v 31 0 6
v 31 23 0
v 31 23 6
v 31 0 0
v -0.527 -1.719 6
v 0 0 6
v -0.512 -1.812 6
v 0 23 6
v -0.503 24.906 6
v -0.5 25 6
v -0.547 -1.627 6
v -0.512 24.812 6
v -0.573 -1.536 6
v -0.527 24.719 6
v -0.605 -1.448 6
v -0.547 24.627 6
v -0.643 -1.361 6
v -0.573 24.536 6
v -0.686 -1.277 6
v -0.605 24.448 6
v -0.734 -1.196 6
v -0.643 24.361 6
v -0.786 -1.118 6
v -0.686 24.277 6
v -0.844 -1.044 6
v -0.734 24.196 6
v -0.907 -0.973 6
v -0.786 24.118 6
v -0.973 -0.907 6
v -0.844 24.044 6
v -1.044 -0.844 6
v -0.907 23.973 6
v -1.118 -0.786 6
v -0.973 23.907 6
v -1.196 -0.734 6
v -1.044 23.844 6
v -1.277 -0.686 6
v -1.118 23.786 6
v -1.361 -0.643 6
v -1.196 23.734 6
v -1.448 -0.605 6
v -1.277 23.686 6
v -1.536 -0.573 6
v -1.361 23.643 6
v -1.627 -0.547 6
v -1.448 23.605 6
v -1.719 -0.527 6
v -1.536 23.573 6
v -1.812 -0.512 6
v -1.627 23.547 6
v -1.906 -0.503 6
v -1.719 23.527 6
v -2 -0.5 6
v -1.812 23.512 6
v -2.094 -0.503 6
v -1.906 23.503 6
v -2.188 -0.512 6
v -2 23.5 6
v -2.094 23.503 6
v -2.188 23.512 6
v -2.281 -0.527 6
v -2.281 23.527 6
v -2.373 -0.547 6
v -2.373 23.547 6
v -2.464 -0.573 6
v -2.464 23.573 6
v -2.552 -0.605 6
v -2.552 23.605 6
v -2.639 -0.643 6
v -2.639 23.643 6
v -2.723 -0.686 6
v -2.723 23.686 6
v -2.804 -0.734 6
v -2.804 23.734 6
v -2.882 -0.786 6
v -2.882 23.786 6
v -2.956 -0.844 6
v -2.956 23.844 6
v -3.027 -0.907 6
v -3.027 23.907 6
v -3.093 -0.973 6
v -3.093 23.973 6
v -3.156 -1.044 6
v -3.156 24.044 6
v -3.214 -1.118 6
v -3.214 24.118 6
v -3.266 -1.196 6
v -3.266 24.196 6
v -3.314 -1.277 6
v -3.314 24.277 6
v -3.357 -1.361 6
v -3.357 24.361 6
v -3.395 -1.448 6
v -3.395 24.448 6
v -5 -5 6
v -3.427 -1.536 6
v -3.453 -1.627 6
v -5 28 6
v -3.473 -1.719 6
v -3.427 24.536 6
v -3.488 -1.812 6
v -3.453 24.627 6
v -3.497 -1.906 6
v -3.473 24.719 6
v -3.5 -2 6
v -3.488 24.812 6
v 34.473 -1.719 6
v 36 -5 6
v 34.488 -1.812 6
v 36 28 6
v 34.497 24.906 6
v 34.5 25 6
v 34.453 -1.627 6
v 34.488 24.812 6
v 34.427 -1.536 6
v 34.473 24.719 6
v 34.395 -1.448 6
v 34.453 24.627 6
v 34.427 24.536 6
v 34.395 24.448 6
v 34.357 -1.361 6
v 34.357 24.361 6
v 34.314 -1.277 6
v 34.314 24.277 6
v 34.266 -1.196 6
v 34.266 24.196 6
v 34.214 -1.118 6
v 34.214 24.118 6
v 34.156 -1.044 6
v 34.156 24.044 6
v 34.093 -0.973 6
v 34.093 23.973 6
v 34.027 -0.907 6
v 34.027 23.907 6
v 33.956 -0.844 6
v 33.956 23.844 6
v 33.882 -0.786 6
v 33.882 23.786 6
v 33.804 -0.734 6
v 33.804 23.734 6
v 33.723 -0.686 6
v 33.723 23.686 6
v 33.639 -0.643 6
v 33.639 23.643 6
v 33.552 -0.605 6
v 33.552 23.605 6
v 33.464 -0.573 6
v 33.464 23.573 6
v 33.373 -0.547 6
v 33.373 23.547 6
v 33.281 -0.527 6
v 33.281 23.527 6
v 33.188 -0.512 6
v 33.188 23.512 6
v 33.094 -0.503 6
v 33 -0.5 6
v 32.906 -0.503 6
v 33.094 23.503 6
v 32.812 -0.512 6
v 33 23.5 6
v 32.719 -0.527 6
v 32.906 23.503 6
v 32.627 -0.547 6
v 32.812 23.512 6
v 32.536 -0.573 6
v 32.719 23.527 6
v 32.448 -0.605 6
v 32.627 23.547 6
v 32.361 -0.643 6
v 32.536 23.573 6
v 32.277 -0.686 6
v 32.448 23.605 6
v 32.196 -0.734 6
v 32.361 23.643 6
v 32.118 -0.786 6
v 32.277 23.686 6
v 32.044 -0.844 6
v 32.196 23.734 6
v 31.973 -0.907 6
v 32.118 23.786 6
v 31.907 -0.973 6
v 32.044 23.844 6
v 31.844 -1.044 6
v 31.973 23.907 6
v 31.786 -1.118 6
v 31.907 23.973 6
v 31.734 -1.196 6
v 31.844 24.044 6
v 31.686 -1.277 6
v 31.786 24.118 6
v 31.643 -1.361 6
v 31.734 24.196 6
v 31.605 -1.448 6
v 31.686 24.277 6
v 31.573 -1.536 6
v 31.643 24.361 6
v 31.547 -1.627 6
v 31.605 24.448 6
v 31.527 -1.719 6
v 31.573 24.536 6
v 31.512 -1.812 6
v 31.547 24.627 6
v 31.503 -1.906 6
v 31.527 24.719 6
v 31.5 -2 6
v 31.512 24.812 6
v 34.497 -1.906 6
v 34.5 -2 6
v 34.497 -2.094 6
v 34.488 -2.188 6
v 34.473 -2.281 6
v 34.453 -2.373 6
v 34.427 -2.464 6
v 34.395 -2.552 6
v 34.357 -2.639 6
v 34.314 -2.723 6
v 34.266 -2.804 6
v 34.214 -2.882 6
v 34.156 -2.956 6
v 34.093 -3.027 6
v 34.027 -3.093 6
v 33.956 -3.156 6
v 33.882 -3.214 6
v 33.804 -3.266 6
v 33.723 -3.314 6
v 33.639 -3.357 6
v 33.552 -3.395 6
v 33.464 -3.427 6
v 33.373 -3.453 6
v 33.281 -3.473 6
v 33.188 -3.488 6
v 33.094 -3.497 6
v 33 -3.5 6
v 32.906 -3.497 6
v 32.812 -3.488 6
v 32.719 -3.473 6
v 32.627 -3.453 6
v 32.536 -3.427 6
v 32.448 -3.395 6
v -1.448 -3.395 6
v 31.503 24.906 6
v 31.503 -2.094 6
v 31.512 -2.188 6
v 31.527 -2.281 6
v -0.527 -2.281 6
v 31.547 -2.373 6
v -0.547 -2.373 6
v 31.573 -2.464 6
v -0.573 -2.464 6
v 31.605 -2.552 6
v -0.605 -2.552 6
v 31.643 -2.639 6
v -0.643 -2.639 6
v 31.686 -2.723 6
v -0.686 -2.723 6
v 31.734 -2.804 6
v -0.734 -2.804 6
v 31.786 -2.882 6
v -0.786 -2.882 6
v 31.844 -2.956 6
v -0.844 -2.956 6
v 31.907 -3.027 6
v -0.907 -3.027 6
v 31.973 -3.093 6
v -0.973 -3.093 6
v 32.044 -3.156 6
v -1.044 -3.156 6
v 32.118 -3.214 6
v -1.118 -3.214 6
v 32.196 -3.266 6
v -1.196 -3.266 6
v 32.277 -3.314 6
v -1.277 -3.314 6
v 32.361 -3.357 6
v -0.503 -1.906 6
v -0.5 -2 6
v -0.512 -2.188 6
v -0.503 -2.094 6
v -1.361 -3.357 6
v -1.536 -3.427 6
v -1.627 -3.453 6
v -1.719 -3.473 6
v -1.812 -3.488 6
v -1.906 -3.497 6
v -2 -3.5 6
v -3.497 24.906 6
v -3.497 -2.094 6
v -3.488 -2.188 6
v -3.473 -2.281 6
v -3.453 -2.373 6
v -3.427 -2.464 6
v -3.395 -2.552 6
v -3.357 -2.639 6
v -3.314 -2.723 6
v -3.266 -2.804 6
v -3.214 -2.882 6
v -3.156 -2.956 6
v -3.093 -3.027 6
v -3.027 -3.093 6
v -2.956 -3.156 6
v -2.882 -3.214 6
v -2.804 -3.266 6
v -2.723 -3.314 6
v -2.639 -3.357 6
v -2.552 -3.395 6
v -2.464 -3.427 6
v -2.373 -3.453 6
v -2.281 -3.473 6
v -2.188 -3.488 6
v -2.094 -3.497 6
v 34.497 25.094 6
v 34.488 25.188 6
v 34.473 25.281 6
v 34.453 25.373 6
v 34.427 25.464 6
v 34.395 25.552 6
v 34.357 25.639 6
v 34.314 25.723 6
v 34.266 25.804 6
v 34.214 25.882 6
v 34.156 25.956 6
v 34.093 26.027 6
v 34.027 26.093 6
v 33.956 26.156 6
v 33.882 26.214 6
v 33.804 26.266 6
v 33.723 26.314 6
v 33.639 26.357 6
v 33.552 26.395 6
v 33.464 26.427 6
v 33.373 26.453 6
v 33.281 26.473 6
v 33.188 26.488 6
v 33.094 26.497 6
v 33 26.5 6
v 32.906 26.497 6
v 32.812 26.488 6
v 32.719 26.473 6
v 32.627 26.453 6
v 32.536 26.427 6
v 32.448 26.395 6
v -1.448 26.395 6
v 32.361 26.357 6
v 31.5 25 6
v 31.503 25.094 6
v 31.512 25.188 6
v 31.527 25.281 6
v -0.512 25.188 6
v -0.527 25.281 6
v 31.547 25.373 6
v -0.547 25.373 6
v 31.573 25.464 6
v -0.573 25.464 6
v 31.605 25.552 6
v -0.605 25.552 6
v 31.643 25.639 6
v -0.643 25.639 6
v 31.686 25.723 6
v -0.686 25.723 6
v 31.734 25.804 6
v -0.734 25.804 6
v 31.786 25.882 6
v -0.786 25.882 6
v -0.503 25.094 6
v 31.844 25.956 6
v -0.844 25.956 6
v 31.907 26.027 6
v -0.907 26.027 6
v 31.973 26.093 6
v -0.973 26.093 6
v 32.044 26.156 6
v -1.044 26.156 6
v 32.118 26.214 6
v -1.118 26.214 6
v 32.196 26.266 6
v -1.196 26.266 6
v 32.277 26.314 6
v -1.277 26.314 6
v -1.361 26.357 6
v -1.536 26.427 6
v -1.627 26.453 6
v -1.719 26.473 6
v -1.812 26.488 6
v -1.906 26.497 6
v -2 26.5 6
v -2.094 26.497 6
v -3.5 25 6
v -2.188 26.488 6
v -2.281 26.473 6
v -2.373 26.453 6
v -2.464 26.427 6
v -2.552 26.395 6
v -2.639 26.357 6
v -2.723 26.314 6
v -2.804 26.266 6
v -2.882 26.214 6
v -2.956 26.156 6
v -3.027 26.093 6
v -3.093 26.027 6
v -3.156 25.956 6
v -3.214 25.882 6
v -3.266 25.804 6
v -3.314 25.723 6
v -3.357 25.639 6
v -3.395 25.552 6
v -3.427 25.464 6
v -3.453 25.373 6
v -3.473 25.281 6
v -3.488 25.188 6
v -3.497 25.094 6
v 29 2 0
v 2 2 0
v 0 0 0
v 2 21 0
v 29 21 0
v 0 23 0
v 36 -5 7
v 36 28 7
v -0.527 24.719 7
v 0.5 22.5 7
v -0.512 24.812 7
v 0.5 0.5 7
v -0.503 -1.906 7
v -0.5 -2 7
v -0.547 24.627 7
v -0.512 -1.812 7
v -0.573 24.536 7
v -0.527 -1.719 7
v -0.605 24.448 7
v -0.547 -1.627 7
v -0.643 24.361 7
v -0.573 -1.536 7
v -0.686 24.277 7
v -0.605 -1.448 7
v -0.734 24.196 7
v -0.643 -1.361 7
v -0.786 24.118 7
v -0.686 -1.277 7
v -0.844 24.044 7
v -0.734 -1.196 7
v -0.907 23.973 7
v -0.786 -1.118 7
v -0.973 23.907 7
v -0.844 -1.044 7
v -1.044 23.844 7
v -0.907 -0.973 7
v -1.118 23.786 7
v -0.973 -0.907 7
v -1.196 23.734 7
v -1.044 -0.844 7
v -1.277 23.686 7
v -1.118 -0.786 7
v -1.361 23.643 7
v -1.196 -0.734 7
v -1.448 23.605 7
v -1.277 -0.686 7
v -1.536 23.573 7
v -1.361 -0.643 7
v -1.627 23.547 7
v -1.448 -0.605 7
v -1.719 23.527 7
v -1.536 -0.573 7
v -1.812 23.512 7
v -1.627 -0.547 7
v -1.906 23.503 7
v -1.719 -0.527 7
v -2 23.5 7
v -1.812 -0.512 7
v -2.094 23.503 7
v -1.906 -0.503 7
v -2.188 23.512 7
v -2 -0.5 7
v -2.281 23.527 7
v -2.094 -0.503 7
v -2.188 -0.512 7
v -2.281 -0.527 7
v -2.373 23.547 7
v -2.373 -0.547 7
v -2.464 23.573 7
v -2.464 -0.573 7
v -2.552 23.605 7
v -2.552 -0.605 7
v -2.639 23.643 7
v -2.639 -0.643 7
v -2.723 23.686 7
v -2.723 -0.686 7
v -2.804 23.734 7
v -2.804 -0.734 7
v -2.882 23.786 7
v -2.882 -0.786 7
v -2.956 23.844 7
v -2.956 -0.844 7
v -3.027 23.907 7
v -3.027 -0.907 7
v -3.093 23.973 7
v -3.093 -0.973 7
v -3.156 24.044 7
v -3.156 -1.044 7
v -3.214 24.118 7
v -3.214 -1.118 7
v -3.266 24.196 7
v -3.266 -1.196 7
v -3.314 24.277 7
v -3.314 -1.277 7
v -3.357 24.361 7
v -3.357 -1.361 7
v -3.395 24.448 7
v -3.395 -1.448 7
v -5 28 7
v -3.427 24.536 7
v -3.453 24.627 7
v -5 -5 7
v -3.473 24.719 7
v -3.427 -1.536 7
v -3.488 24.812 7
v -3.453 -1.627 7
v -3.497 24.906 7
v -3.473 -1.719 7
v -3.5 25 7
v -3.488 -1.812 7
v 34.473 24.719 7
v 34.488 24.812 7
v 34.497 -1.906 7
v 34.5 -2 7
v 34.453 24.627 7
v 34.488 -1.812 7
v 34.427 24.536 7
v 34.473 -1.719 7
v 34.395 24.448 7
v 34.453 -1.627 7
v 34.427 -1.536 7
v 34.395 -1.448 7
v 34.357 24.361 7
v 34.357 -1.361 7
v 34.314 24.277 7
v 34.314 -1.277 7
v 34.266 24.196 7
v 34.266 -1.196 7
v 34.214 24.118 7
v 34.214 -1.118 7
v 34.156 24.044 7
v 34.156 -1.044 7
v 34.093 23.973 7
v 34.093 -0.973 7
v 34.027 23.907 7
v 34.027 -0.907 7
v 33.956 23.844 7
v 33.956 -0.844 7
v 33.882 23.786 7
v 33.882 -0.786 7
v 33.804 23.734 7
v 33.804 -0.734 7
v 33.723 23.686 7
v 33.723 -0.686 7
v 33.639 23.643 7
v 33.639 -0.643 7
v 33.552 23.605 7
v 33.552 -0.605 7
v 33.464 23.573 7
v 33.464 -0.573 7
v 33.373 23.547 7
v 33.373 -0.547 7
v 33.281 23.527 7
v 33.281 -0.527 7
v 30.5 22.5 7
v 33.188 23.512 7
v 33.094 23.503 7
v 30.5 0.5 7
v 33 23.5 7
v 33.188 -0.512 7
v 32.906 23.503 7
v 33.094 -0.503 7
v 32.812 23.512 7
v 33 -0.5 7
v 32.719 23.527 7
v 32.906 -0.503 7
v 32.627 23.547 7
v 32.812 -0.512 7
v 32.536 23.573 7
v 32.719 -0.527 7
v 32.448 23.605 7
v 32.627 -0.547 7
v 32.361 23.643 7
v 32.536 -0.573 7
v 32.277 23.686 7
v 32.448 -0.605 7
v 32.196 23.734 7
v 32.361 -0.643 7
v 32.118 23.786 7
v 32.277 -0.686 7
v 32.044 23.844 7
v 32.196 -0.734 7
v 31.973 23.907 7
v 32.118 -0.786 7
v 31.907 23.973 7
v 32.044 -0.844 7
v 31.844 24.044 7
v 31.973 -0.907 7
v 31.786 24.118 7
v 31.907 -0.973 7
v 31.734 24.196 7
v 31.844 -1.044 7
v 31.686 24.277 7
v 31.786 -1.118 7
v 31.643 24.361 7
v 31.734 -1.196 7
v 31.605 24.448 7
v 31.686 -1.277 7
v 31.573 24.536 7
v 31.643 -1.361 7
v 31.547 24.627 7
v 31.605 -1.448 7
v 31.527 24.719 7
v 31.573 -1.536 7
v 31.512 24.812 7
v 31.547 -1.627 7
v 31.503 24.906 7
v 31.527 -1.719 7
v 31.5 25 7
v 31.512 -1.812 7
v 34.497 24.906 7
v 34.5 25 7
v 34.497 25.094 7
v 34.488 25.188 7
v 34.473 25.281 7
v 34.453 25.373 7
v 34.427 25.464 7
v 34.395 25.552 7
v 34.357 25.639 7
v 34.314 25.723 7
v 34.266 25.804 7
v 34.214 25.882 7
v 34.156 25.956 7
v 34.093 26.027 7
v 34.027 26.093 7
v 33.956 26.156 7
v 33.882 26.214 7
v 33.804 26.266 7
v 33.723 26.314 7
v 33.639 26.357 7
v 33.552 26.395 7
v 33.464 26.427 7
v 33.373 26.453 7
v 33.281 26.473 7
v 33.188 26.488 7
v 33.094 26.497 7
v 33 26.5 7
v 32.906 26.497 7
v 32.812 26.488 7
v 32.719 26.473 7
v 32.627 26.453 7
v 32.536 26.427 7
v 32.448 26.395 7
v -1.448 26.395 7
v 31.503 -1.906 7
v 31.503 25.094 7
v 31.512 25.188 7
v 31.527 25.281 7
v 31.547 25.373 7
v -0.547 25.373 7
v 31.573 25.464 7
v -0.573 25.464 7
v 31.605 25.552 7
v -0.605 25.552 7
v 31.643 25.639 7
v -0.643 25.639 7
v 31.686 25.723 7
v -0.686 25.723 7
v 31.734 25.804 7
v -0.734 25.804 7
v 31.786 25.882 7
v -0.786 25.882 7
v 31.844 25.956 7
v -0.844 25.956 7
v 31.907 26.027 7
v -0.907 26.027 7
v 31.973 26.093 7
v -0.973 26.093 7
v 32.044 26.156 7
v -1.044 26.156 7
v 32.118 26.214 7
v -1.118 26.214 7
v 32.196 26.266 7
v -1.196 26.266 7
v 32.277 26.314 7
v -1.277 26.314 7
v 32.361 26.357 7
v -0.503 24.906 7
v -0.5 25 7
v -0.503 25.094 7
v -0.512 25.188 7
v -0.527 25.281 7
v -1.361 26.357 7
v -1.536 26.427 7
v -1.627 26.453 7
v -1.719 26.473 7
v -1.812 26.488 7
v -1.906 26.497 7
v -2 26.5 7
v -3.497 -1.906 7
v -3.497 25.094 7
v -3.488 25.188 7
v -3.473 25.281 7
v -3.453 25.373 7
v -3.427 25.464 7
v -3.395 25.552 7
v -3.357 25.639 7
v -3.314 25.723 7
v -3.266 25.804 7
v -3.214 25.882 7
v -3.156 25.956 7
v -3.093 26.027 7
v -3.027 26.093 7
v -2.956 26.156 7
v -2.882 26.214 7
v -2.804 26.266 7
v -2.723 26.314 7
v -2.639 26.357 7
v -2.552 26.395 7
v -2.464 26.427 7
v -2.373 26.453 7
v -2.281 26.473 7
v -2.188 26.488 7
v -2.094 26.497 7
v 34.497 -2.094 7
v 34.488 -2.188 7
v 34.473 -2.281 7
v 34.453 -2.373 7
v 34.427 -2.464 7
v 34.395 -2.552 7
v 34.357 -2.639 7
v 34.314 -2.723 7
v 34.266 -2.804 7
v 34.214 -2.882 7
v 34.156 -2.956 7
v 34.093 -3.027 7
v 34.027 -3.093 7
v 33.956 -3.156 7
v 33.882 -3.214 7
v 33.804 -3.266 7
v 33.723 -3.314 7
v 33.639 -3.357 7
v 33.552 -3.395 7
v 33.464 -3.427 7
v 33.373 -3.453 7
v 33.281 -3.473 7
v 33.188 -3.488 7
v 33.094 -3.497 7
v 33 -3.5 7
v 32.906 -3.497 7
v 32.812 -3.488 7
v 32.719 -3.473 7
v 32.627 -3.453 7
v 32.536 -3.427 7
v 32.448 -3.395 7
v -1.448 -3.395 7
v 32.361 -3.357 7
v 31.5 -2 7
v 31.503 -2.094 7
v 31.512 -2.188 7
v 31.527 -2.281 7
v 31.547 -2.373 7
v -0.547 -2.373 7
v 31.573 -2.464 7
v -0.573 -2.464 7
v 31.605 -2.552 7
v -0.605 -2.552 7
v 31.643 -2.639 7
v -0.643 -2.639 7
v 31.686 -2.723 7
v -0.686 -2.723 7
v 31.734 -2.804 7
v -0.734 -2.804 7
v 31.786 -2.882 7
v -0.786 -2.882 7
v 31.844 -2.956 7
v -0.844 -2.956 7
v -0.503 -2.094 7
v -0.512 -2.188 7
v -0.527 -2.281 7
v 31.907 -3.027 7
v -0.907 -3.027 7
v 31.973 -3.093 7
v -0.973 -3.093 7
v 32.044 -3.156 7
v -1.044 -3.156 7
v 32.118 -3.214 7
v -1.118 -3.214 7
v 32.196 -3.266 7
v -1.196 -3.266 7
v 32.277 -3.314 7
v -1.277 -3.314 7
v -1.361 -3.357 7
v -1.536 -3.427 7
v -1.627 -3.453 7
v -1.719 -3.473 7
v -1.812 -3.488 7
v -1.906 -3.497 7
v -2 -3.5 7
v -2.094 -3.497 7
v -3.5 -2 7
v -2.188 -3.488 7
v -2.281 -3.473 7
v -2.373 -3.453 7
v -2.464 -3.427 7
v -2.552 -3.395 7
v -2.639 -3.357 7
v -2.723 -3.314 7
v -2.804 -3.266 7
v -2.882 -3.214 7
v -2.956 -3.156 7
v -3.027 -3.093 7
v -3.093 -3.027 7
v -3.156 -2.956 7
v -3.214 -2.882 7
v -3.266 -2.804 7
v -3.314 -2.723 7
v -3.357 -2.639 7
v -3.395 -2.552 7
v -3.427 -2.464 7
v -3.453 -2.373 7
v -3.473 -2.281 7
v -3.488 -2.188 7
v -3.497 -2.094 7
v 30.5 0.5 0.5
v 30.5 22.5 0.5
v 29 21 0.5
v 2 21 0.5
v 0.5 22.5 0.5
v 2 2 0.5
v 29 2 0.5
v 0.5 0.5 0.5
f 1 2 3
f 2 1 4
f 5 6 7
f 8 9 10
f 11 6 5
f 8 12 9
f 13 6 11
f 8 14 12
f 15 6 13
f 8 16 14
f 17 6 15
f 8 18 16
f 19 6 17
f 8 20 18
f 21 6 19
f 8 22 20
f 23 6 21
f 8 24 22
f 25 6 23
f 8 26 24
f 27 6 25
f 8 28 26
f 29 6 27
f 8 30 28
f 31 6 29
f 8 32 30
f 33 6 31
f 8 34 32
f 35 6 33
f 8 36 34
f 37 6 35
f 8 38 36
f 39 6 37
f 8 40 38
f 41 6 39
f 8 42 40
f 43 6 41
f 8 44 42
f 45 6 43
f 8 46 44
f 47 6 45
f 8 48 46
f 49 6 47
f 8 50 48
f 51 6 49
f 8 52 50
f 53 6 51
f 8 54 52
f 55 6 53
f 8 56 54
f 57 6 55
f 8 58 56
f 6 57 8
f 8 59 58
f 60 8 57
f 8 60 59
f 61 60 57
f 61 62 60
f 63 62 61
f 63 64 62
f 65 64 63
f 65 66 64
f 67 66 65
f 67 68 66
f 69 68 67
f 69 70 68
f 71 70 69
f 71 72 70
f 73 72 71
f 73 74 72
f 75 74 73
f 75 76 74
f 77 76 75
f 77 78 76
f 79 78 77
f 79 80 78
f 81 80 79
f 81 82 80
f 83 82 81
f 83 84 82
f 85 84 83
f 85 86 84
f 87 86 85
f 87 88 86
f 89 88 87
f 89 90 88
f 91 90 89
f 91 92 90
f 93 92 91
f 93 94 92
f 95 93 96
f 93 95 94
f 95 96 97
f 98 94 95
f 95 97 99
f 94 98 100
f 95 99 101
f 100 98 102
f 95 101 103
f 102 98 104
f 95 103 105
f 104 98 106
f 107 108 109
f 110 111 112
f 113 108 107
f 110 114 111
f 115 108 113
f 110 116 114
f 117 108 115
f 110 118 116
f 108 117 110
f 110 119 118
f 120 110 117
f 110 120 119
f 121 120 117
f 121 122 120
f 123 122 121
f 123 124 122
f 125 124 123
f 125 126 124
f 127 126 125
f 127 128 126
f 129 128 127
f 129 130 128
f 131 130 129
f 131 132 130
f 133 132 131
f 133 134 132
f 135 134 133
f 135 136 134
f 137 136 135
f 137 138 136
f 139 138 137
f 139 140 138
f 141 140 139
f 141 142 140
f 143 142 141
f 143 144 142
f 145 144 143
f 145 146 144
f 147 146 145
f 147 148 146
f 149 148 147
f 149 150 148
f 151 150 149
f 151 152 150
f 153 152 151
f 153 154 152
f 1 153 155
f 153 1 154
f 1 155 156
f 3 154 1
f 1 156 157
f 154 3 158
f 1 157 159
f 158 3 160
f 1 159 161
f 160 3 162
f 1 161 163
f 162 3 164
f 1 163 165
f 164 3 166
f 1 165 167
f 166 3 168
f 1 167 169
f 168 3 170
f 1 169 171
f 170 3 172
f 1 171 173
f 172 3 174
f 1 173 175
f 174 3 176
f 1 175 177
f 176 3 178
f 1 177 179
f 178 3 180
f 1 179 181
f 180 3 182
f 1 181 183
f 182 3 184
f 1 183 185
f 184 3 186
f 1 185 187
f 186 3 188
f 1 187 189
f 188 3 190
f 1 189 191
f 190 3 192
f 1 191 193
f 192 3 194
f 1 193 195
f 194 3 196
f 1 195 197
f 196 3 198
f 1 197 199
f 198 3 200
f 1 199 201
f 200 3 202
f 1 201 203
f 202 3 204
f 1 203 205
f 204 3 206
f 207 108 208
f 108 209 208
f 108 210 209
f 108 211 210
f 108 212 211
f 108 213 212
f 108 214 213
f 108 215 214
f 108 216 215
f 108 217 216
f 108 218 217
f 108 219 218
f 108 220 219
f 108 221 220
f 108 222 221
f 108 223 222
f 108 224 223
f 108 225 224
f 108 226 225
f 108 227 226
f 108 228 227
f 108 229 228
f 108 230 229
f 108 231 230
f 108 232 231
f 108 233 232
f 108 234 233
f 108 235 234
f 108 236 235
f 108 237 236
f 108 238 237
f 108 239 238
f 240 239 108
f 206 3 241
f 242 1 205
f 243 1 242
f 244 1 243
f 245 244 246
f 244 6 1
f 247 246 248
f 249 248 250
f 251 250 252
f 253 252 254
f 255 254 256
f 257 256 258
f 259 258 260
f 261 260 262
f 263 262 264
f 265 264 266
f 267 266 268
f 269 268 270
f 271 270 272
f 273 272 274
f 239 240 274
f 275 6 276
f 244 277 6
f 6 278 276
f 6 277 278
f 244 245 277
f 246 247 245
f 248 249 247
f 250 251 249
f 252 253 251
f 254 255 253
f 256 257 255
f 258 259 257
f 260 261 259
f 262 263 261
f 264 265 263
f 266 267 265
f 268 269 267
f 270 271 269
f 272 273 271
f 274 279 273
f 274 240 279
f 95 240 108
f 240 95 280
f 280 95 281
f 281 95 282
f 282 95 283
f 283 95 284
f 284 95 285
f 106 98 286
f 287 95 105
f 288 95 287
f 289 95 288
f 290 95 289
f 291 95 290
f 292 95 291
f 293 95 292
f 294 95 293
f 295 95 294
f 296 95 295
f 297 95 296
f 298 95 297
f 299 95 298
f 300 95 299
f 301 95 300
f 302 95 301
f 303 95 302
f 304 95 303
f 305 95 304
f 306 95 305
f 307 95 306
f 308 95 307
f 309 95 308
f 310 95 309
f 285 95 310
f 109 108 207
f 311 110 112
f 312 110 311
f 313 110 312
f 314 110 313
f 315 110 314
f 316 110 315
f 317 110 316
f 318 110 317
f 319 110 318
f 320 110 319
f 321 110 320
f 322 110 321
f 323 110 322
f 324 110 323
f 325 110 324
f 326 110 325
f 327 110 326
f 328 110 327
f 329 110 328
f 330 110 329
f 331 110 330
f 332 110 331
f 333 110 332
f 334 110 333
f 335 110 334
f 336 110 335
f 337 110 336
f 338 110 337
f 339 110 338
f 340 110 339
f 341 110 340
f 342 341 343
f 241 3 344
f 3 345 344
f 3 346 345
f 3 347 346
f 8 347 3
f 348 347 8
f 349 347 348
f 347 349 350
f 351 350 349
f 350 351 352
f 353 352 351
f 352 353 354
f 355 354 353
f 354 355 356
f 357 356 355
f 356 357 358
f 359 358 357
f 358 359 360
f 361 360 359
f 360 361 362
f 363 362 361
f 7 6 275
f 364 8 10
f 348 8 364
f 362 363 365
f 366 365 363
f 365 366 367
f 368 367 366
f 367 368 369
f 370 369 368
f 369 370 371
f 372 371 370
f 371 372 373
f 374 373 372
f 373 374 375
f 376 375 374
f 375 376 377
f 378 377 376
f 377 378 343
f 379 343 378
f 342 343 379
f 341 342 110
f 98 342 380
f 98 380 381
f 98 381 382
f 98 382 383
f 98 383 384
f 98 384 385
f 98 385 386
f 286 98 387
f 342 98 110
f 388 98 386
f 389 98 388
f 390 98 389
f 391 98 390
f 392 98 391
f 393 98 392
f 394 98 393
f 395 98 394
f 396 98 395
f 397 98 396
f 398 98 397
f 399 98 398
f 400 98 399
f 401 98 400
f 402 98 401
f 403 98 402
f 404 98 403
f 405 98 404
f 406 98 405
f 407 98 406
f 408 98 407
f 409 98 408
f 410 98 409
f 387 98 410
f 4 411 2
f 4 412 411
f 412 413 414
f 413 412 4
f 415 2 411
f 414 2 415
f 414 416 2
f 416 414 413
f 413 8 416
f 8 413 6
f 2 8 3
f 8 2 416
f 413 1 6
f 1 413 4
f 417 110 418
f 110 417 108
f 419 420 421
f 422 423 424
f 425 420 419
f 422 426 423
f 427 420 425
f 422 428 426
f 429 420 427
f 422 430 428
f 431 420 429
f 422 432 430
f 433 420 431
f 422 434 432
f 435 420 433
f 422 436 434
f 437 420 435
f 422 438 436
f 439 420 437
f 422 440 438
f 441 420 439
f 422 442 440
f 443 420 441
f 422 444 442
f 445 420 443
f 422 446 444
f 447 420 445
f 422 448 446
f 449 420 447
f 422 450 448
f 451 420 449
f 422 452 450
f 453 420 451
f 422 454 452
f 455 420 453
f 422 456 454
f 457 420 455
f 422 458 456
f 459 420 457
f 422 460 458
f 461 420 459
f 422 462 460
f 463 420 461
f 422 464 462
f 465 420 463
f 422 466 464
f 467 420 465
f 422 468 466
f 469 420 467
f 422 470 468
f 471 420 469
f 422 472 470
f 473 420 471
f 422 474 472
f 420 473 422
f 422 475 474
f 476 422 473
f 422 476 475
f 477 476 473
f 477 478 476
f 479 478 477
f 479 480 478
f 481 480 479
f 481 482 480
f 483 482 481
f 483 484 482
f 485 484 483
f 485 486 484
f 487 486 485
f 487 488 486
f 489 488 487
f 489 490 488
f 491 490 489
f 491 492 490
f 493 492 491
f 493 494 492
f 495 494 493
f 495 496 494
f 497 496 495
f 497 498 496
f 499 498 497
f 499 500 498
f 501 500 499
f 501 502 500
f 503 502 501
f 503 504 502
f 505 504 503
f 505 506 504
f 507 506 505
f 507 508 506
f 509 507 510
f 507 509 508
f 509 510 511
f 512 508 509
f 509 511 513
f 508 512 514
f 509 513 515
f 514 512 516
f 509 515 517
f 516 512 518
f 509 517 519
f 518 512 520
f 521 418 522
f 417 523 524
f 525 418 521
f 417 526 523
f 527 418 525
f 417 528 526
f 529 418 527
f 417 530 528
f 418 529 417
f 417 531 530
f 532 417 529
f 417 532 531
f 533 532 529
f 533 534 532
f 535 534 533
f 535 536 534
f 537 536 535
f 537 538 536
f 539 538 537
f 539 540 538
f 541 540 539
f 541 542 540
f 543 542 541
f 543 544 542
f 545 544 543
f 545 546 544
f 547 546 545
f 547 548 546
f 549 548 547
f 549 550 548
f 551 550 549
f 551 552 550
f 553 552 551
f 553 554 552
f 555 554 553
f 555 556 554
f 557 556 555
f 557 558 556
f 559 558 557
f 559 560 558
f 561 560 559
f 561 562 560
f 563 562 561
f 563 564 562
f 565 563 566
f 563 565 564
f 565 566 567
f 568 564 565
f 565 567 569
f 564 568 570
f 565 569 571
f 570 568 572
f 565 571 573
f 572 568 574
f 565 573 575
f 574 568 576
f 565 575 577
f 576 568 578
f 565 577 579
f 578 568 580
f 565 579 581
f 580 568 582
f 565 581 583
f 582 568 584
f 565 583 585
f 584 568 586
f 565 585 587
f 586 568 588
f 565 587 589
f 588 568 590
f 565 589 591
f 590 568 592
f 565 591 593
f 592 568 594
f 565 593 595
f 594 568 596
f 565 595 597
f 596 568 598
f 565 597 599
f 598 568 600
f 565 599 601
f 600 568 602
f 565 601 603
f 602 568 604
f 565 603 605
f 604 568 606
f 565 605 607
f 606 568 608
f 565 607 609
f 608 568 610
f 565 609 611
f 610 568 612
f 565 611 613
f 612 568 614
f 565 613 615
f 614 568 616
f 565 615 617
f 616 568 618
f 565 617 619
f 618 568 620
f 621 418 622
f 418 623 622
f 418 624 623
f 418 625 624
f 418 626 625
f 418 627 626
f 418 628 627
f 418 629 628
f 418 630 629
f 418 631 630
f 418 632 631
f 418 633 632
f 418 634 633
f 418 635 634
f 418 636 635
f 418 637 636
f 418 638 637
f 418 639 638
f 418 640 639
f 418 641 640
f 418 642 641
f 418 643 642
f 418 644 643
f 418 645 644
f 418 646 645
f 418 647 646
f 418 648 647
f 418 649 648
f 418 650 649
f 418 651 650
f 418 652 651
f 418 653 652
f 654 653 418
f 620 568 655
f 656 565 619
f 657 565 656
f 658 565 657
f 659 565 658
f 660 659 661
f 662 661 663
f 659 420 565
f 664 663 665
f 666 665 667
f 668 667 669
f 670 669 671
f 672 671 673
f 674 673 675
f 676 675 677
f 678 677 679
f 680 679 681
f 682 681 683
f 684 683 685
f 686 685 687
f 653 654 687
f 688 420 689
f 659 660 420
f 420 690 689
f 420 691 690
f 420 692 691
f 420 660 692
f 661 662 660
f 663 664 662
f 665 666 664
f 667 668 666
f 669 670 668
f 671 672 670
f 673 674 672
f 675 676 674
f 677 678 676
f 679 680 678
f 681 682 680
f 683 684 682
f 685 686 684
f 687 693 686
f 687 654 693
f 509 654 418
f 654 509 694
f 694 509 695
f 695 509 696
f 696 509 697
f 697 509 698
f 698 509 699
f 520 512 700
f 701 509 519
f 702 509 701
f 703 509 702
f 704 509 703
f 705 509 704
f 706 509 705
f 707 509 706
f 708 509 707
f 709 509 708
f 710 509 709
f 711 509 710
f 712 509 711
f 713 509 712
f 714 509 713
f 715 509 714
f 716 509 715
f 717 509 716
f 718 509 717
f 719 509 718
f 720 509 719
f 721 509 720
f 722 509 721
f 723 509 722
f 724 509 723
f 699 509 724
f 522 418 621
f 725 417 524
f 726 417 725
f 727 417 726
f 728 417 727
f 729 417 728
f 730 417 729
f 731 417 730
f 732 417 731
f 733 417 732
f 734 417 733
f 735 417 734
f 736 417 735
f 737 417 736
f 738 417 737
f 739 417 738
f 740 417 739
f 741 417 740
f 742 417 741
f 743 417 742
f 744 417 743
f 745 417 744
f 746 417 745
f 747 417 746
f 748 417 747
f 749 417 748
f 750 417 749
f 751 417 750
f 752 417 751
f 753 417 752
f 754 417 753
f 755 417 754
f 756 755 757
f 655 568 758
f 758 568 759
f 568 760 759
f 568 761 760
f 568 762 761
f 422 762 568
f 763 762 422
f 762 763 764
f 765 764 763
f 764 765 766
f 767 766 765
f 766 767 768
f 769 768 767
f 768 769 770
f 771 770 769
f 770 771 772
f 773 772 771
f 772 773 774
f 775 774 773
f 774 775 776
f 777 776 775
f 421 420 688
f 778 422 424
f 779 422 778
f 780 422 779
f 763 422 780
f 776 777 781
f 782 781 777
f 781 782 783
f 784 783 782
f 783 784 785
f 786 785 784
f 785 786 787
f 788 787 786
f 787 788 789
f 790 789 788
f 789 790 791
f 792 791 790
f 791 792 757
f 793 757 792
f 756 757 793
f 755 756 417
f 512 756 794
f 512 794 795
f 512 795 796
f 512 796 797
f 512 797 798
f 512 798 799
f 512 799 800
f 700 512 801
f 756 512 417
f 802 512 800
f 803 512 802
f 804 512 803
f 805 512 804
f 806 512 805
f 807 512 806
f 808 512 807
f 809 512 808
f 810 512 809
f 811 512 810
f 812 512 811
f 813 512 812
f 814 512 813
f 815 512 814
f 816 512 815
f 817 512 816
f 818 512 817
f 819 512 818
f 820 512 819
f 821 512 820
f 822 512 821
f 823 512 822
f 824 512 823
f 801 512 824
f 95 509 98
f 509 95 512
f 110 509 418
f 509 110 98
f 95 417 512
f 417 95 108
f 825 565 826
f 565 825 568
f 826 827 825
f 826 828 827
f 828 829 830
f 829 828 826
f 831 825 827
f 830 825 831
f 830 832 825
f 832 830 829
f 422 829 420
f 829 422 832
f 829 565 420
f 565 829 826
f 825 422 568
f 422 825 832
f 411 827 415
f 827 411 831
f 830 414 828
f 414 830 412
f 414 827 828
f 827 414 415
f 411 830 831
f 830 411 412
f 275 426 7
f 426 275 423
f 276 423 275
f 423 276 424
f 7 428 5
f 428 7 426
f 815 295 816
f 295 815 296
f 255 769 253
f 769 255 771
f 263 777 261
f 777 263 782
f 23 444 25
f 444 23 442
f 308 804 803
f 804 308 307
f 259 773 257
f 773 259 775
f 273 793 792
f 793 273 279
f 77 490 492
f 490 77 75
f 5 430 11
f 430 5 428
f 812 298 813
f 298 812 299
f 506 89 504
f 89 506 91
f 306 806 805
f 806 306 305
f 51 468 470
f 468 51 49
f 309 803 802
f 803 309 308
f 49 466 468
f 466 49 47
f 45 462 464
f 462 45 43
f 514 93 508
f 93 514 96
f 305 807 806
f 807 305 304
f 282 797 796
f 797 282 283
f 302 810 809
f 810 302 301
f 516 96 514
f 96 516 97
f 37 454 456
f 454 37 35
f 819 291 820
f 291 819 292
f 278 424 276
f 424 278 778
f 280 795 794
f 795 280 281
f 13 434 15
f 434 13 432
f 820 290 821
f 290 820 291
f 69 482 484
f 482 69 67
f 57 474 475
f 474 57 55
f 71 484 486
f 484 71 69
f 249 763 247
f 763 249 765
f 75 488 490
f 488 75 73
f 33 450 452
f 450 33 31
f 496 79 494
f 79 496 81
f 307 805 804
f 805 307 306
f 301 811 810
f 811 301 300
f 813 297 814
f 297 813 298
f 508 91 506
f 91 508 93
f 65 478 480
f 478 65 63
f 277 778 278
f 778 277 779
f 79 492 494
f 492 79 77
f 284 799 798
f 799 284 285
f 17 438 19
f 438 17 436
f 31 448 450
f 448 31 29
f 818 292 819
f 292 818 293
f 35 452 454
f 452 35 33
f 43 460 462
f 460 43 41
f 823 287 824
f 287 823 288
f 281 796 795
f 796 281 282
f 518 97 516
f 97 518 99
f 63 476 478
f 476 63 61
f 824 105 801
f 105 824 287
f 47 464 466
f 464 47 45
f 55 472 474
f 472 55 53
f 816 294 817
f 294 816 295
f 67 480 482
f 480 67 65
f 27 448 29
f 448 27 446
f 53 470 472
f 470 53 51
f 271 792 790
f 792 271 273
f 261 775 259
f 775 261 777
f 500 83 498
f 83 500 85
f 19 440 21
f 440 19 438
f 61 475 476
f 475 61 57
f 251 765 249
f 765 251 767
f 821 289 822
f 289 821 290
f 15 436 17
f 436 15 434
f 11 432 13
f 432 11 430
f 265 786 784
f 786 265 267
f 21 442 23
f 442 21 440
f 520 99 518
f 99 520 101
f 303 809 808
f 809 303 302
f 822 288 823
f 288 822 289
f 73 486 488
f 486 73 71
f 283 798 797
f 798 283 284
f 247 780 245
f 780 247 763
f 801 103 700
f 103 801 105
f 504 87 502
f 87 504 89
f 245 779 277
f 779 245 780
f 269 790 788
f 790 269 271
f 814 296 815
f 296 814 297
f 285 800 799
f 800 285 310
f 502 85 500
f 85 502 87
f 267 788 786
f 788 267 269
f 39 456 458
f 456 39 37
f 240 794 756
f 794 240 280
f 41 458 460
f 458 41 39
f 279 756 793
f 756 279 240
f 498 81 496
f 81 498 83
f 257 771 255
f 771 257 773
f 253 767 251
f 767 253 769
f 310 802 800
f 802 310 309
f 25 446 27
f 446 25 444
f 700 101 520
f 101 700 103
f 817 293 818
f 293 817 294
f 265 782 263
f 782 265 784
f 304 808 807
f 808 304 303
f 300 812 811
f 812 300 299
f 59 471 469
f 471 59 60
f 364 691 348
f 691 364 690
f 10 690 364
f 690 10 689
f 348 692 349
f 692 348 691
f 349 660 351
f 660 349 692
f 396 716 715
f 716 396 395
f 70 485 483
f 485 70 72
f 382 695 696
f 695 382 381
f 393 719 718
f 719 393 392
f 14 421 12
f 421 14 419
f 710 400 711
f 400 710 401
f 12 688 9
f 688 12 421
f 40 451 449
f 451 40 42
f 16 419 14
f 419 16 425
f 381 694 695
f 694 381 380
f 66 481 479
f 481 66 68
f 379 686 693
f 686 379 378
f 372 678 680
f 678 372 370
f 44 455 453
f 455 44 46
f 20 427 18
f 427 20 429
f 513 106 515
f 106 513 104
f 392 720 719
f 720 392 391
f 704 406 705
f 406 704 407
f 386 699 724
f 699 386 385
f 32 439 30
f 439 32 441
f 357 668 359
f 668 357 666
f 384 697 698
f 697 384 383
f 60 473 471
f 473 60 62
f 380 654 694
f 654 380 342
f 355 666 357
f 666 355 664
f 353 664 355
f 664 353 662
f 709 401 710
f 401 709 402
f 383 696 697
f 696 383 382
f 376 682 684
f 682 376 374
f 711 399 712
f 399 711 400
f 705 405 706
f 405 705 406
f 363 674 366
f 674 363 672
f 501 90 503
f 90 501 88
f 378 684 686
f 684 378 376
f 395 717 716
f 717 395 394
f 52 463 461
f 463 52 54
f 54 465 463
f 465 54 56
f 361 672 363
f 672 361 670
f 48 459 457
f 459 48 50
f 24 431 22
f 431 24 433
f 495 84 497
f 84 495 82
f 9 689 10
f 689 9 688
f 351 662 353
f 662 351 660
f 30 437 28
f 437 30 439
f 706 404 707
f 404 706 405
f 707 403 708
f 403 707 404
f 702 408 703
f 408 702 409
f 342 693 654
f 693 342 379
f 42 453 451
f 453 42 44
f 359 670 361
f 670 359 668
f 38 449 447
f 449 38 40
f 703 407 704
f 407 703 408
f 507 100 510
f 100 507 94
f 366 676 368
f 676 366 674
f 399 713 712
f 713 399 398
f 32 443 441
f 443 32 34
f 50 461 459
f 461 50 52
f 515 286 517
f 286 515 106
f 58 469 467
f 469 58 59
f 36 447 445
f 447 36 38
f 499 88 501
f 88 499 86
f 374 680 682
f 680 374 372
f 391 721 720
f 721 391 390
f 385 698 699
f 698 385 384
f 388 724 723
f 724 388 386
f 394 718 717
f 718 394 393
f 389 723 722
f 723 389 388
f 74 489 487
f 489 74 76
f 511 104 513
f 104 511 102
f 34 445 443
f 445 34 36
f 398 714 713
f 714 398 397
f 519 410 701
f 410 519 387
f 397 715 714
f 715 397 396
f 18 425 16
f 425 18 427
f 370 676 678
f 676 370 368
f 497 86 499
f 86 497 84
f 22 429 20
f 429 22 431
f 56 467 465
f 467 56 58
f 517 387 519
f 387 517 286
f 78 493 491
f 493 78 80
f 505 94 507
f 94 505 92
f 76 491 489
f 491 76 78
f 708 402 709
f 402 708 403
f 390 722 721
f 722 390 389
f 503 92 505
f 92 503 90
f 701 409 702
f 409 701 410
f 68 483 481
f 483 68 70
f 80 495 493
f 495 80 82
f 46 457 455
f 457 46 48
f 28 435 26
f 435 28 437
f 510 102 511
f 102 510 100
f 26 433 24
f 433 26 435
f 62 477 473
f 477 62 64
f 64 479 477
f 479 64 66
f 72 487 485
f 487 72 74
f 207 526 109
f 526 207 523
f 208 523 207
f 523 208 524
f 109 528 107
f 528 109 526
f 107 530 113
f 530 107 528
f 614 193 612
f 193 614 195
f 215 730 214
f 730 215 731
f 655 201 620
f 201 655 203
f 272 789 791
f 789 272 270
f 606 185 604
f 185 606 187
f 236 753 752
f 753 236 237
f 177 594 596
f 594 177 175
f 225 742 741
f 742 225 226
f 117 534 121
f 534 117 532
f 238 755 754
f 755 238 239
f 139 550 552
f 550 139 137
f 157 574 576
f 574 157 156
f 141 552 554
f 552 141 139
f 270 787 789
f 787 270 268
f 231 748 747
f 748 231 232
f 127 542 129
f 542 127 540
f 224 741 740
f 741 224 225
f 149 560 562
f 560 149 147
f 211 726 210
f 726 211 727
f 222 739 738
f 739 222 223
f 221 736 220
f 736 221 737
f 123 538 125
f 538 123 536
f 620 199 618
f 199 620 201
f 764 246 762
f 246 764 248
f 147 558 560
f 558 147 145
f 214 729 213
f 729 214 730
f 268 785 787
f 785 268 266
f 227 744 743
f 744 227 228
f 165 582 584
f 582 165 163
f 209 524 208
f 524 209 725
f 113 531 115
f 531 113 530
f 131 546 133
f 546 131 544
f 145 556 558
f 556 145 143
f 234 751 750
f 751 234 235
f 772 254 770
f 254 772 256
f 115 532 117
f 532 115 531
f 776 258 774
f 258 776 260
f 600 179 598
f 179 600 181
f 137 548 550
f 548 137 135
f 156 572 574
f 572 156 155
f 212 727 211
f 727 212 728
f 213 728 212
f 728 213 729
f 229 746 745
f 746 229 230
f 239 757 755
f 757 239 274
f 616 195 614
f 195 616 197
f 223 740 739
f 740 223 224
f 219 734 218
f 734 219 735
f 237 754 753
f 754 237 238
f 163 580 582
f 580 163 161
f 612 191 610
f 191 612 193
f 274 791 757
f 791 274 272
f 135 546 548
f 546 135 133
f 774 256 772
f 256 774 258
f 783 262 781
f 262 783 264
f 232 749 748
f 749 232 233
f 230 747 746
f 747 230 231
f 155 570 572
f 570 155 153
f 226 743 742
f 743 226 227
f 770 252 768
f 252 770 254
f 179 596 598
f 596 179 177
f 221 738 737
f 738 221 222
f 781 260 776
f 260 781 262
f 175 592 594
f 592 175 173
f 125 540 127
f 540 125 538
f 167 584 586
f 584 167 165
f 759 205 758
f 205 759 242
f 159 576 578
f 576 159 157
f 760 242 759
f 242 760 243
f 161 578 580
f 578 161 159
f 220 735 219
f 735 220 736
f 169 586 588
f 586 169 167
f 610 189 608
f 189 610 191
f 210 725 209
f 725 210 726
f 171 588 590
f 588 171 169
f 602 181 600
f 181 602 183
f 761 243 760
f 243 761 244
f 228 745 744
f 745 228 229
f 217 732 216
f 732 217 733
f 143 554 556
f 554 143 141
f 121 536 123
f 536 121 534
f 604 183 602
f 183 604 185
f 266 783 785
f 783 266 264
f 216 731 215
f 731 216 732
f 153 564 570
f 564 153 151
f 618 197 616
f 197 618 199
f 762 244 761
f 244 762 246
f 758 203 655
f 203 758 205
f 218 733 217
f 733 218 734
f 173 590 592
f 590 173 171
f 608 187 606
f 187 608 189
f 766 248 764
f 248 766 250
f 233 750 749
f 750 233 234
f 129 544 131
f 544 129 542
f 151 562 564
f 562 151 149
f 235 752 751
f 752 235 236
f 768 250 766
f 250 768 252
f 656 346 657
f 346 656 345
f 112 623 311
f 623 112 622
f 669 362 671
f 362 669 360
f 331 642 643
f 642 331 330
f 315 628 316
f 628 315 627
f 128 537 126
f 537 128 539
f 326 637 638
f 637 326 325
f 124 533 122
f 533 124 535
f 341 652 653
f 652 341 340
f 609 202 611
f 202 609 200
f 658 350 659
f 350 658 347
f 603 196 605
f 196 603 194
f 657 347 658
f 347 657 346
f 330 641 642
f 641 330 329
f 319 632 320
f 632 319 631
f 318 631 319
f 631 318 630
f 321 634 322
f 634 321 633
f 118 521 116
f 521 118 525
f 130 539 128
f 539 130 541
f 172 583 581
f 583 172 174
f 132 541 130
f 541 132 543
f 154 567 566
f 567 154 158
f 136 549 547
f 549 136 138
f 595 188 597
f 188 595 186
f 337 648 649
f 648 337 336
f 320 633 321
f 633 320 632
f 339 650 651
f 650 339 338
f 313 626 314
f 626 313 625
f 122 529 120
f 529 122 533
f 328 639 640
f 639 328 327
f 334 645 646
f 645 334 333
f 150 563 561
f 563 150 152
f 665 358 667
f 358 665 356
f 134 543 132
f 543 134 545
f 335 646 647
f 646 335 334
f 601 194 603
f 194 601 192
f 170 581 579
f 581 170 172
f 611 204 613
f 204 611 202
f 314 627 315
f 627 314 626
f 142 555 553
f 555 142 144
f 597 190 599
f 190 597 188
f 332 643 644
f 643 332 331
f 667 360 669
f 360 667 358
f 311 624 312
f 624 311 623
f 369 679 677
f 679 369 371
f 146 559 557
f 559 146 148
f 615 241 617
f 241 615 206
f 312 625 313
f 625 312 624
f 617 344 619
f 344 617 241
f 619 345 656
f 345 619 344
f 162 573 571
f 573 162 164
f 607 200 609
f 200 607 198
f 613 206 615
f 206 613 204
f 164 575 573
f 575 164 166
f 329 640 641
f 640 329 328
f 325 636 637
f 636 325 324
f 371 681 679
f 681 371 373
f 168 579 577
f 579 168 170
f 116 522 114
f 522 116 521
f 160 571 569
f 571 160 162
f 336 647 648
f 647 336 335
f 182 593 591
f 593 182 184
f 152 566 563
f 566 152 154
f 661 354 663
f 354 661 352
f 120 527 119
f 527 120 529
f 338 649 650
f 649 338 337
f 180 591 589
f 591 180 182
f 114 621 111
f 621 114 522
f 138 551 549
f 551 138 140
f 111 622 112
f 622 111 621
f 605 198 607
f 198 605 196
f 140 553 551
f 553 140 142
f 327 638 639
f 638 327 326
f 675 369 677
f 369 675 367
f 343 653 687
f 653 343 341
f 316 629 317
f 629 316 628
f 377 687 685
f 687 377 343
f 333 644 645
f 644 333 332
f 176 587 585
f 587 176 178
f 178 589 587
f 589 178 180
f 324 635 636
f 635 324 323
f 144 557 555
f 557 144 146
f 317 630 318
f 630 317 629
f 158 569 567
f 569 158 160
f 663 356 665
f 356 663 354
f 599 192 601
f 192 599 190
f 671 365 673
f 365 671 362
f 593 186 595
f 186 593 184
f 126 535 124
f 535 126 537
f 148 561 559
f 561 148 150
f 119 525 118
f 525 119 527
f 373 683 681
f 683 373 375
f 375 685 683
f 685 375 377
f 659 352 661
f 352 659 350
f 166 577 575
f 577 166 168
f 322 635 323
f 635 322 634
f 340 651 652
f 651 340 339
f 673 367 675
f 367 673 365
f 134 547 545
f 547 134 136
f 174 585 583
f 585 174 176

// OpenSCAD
difference () {
	union() {
		cube (size = [31, 23, 6], center=false);
		translate([-5, -5, 6])
		cube (size = [41, 33, 1], center=false);
	}
	translate([0.5, 0.5, 0.5])
	cube (size = [30, 22, 8], center=false);
	translate([2, 2, 0])
	cube (size = [27, 19, 1], center=false);
	hole(-2, -2);
	hole(-2, 25);
	hole(33, -2);
	hole(33, 25);
}

module hole(x,y) {
	translate([x,y, 6])
	cylinder (h = 1, r=1.5, center = false, $fn=100);
}
